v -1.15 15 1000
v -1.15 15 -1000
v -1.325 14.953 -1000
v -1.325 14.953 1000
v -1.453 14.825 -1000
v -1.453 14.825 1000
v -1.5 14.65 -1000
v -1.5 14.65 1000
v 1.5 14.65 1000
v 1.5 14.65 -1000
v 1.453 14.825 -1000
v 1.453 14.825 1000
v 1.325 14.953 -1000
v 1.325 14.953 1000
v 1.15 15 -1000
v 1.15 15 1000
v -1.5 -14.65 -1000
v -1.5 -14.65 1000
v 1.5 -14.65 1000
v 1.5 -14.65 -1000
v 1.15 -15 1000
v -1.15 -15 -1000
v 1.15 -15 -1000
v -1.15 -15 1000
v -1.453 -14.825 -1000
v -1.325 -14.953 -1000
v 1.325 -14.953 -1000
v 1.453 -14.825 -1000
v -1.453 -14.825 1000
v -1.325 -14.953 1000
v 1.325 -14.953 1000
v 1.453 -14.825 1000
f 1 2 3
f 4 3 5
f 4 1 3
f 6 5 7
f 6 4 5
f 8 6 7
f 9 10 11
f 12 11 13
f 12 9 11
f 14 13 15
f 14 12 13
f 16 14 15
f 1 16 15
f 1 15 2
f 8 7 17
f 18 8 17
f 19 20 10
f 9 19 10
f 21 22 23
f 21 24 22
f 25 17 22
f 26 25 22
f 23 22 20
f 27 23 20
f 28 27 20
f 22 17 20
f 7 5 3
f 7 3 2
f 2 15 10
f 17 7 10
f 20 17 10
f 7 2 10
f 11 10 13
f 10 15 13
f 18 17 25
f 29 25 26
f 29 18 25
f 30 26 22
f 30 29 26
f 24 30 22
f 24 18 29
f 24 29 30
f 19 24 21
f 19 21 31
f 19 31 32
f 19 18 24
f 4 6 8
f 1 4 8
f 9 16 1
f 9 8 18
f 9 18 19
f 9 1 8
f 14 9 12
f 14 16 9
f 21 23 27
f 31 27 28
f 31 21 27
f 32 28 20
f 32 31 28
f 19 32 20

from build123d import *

# Parameters (mm, degrees)
BOSS_EXTRUDE1_DEPTH      = 1000
BOSS_EXTRUDE1_DEPTH_BACK = 1000


with BuildPart() as part:
    # Sketch1 → Boss-Extrude1 (new, two sides: drawn at the far end of the back side and taken through both)
    with BuildSketch(Plane.XY.offset(-BOSS_EXTRUDE1_DEPTH_BACK)):
        with BuildLine():
            Line((-1.15, -15), (1.15, -15))
            ThreePointArc((1.15, -15), (1.397487373, -14.897487373), (1.5, -14.65))
            Line((1.5, -14.65), (1.5, 14.65))
            ThreePointArc((1.5, 14.65), (1.397487373, 14.897487373), (1.15, 15))
            Line((1.15, 15), (-1.15, 15))
            ThreePointArc((-1.15, 15), (-1.397487373, 14.897487373), (-1.5, 14.65))
            Line((-1.5, 14.65), (-1.5, -14.65))
            ThreePointArc((-1.5, -14.65), (-1.397487373, -14.897487373), (-1.15, -15))
        make_face()
    extrude(amount=BOSS_EXTRUDE1_DEPTH + BOSS_EXTRUDE1_DEPTH_BACK)


solid = part.part
